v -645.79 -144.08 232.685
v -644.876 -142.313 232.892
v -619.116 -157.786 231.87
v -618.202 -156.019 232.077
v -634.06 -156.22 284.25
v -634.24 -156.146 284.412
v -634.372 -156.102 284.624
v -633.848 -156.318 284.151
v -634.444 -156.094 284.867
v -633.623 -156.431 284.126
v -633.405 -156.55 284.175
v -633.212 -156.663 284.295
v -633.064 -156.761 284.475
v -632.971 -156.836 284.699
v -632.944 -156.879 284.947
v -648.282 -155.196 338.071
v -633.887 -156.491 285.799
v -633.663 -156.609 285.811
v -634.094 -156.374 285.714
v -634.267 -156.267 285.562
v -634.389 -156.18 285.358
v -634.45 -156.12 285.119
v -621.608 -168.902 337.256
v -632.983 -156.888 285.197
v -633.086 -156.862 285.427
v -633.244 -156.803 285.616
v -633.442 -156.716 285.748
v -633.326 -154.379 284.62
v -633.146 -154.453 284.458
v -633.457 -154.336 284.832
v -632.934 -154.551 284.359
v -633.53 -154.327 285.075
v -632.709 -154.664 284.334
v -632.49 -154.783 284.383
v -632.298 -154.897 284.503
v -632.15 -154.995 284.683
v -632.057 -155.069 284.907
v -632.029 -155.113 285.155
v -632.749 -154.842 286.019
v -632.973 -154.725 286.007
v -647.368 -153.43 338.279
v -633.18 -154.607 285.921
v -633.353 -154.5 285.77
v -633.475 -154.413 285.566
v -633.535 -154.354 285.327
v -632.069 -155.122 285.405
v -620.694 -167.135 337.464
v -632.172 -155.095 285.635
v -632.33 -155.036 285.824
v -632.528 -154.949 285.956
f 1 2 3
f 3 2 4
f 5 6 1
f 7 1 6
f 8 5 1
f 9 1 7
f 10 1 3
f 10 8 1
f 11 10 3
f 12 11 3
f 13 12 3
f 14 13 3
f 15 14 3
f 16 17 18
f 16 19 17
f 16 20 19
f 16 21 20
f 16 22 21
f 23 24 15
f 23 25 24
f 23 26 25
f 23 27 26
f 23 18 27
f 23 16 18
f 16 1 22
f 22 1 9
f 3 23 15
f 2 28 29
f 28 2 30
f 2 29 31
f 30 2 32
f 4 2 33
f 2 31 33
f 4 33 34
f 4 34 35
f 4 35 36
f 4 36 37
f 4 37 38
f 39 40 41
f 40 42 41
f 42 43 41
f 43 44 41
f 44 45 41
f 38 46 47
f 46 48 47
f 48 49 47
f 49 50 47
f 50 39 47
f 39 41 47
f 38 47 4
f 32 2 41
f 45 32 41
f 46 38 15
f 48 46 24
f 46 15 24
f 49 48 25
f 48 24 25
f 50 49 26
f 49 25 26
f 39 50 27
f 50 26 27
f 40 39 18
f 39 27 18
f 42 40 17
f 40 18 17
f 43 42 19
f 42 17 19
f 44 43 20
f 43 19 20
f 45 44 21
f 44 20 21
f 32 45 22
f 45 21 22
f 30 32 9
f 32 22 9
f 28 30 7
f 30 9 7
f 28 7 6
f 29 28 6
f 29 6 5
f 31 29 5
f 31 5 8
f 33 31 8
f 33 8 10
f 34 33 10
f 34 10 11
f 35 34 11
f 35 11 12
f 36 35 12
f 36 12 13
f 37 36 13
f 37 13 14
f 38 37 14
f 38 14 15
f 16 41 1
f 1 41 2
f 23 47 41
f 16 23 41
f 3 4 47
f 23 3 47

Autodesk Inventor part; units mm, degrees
ref_plane "YZ Plane" through (0, 0, 0) normal (1, 0, 0) x (0, 1, 0)
ref_plane "XZ Plane" through (0, 0, 0) normal (0, 1, 0) x (-1, 0, 0)
ref_plane "XY Plane" through (0, 0, 0) normal (0, 0, 1) x (1, 0, 0)
ref_plane "Work Plane1" through (-728.8112, -105.3847, 288.112) normal (-0.4570507, -0.8833415, -0.1039826) x (0.88913, -0.4568478, -0.0271666)
sketch "Sketch1" plane through (-728.8112, -105.3847, 288.112) normal (-0.4570507, -0.8833415, -0.1039826) x (0.88913, -0.4568478, -0.0271666)
  line L0 (-49.7406, -45) -> (-49.7406, -53)
  line L1 (-49.7406, -53) -> (123, -53)
  line L2 (123, -53) -> (123, 53)
  line L3 (123, 53) -> (-49.7406, 53)
  line L4 (-49.7406, 53) -> (-49.7406, 45)
  line L5 (-49.7406, 45) -> (-91.8594, 45)
  line L6 (-91.8594, 45) -> (-91.8594, 53)
  line L7 (-91.8594, 53) -> (-123, 53)
  line L8 (-123, 53) -> (-123, -53)
  line L9 (-123, -53) -> (-91.8594, -53)
  line L10 (-91.8594, -53) -> (-91.8594, -45)
  line L11 (-91.8594, -45) -> (-49.7406, -45)
  line L12 (-95.4, -15.0028) -> (-111.4, -15.0028)
  line L13 (-111.4, -15.0028) -> (-111.4, 13.9972)
  line L14 (-111.4, 13.9972) -> (-95.4, 13.9972)
  line L15 (-95.4, 13.9972) -> (-95.4, -15.0028)
  line L16 (123, 53) -> (93, 53)
  line L17 (93, 53) -> (93, -53)
  line L18 (93, -53) -> (123, -53)
  line L19 (123, -53) -> (123, 53)
  point P0 (607.6902, -314.6271)
  dimension "d0" = 30
extrude "Extrusion1" add sketch "Sketch1" along normal blind 2 contours L17 L3 L2 L1
sketch "Sketch4" plane through (-729.7253, -107.1513, 287.9041) normal (-0.4570507, -0.8833415, -0.1039826) x (0.88913, -0.4568478, -0.0271666)
  circle A0 centre (108, 0) radius 0.85
  point P0 (607.6902, -314.6271)
extrude "Extrusion4" cut sketch "Sketch4" against normal up to next
thread "Thread1" size "M1.7x0.35" class "6H" standard "ISO Metric profile" full length
properties part number "Fram"
